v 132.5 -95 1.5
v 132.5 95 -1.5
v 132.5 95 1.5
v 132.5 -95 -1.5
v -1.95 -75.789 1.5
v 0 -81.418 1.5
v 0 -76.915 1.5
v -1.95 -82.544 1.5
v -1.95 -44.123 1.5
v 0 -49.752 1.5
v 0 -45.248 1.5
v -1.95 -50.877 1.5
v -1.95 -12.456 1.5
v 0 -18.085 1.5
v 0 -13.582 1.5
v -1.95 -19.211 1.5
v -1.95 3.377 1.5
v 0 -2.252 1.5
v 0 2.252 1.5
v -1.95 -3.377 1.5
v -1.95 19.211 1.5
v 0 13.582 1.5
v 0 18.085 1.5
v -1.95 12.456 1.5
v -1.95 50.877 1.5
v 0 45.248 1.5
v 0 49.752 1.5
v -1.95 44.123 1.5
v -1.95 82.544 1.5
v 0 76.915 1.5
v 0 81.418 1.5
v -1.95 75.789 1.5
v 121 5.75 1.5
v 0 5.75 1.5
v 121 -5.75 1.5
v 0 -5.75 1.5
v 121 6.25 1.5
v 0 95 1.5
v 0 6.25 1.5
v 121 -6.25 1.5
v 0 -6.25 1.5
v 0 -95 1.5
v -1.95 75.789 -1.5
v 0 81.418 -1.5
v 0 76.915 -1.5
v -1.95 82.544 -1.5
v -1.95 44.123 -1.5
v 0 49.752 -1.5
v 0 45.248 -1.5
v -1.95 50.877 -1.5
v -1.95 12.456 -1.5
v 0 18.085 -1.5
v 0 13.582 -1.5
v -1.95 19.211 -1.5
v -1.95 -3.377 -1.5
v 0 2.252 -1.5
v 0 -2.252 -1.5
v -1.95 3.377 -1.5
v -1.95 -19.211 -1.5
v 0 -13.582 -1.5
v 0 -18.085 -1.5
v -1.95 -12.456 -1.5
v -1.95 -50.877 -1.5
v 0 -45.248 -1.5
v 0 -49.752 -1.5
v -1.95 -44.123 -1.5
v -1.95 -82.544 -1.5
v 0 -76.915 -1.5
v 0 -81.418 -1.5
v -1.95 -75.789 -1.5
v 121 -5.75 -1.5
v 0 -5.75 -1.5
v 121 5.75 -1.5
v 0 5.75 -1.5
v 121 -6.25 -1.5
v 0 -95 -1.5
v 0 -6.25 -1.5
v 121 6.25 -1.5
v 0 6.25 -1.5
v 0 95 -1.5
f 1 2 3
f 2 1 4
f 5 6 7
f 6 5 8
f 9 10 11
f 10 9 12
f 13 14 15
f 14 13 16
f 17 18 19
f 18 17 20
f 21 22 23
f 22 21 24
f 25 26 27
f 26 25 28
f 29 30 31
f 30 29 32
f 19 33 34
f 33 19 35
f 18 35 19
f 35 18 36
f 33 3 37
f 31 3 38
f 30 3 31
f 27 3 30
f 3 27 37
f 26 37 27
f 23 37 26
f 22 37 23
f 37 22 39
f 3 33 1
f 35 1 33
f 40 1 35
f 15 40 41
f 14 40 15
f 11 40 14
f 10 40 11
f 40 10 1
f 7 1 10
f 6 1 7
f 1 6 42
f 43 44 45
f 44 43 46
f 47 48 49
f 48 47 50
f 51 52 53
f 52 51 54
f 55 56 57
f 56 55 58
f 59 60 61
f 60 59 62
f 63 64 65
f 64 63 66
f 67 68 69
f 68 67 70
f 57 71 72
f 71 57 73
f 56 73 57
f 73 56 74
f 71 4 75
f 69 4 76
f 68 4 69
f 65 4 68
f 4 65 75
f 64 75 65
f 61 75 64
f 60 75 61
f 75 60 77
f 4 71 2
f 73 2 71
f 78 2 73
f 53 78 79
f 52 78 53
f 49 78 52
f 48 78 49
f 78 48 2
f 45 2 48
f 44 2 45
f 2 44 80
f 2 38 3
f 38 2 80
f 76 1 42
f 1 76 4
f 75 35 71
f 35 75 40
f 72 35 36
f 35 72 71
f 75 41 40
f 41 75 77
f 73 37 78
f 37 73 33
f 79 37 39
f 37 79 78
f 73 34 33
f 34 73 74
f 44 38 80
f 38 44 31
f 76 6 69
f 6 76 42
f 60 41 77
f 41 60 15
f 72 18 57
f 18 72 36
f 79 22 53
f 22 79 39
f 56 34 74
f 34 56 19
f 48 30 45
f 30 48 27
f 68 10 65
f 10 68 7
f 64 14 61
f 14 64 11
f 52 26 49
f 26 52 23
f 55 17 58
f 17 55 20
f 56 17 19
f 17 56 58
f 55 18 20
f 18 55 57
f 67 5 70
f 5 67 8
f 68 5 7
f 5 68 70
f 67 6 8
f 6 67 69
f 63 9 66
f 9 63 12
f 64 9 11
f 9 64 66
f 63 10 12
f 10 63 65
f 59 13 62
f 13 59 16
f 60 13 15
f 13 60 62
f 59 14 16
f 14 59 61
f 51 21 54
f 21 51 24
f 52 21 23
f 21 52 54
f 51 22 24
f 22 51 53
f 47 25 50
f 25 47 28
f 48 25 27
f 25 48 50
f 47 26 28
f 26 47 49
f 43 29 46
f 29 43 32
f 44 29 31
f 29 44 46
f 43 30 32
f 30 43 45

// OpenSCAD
// Final parameters
CASE_WIDTH=265;
CASE_HEIGHT=95;
JIG_THICKNESS=3;
ZIPPER_SLOT_LENGTH=230;

// Draft parameters
//CASE_WIDTH=50;
//CASE_HEIGHT=95;
//JIG_THICKNESS=3;
//ZIPPER_SLOT_LENGTH=30;

ZIPPER_SLOT_WIDTH=12;
BLADE_THICKNESS=0.3;
//SLIT_EXTRA_SPACE=0.3; // this was a little loose
SLIT_EXTRA_SPACE=0.2;
EXTRA_SLIT_LENGTH=6;
//FIT_TOLERANCE=0.15; // this was a little loose
FIT_TOLERANCE=0.1;
TRIANGLE_SIZE=4;

module slit() {
    cube([ZIPPER_SLOT_LENGTH + 2*EXTRA_SLIT_LENGTH, BLADE_THICKNESS + SLIT_EXTRA_SPACE, JIG_THICKNESS*10], center=true);
}

module whole_jig() {
    difference() {
        cube([CASE_WIDTH, CASE_HEIGHT * 2, JIG_THICKNESS], center=true);
        translate([0,-ZIPPER_SLOT_WIDTH/2,0]) slit();
        translate([0,ZIPPER_SLOT_WIDTH/2,0]) slit();
    }
}

module half_jig_1() {
    difference() {
        whole_jig();
        translate([500,0,0]) cube([1000,1000,1000], center=true);
        triangle_cut_out();
        translate([0, -CASE_HEIGHT/6*5, 0]) triangle_cut_out();
        translate([0, -CASE_HEIGHT/2, 0]) triangle_cut_out();
        translate([0, -CASE_HEIGHT/6, 0]) triangle_cut_out();
        translate([0, CASE_HEIGHT/6, 0]) triangle_cut_out();
        translate([0, CASE_HEIGHT/2, 0]) triangle_cut_out();
        translate([0, CASE_HEIGHT/6*5, 0]) triangle_cut_out();
    }
}

module half_jig_2() {
    difference() {
        whole_jig();
        translate([-500,0,0]) cube([1000,1000,1000], center=true);
    }
    triangle();
    translate([0, -CASE_HEIGHT/6*5, 0]) triangle();
    translate([0, -CASE_HEIGHT/2, 0]) triangle();
    translate([0, -CASE_HEIGHT/6, 0]) triangle();
    translate([0, CASE_HEIGHT/6, 0]) triangle();
    translate([0, CASE_HEIGHT/2, 0]) triangle();
    translate([0, CASE_HEIGHT/6*5, 0]) triangle();
}

module triangle() {
    cylinder(JIG_THICKNESS, TRIANGLE_SIZE - FIT_TOLERANCE, TRIANGLE_SIZE - FIT_TOLERANCE, $fn=3, center=true);
}

module triangle_cut_out() {
    cylinder(JIG_THICKNESS*10, TRIANGLE_SIZE + FIT_TOLERANCE, TRIANGLE_SIZE + FIT_TOLERANCE, $fn=3, center=true);
}

//half_jig_1();
half_jig_2();
